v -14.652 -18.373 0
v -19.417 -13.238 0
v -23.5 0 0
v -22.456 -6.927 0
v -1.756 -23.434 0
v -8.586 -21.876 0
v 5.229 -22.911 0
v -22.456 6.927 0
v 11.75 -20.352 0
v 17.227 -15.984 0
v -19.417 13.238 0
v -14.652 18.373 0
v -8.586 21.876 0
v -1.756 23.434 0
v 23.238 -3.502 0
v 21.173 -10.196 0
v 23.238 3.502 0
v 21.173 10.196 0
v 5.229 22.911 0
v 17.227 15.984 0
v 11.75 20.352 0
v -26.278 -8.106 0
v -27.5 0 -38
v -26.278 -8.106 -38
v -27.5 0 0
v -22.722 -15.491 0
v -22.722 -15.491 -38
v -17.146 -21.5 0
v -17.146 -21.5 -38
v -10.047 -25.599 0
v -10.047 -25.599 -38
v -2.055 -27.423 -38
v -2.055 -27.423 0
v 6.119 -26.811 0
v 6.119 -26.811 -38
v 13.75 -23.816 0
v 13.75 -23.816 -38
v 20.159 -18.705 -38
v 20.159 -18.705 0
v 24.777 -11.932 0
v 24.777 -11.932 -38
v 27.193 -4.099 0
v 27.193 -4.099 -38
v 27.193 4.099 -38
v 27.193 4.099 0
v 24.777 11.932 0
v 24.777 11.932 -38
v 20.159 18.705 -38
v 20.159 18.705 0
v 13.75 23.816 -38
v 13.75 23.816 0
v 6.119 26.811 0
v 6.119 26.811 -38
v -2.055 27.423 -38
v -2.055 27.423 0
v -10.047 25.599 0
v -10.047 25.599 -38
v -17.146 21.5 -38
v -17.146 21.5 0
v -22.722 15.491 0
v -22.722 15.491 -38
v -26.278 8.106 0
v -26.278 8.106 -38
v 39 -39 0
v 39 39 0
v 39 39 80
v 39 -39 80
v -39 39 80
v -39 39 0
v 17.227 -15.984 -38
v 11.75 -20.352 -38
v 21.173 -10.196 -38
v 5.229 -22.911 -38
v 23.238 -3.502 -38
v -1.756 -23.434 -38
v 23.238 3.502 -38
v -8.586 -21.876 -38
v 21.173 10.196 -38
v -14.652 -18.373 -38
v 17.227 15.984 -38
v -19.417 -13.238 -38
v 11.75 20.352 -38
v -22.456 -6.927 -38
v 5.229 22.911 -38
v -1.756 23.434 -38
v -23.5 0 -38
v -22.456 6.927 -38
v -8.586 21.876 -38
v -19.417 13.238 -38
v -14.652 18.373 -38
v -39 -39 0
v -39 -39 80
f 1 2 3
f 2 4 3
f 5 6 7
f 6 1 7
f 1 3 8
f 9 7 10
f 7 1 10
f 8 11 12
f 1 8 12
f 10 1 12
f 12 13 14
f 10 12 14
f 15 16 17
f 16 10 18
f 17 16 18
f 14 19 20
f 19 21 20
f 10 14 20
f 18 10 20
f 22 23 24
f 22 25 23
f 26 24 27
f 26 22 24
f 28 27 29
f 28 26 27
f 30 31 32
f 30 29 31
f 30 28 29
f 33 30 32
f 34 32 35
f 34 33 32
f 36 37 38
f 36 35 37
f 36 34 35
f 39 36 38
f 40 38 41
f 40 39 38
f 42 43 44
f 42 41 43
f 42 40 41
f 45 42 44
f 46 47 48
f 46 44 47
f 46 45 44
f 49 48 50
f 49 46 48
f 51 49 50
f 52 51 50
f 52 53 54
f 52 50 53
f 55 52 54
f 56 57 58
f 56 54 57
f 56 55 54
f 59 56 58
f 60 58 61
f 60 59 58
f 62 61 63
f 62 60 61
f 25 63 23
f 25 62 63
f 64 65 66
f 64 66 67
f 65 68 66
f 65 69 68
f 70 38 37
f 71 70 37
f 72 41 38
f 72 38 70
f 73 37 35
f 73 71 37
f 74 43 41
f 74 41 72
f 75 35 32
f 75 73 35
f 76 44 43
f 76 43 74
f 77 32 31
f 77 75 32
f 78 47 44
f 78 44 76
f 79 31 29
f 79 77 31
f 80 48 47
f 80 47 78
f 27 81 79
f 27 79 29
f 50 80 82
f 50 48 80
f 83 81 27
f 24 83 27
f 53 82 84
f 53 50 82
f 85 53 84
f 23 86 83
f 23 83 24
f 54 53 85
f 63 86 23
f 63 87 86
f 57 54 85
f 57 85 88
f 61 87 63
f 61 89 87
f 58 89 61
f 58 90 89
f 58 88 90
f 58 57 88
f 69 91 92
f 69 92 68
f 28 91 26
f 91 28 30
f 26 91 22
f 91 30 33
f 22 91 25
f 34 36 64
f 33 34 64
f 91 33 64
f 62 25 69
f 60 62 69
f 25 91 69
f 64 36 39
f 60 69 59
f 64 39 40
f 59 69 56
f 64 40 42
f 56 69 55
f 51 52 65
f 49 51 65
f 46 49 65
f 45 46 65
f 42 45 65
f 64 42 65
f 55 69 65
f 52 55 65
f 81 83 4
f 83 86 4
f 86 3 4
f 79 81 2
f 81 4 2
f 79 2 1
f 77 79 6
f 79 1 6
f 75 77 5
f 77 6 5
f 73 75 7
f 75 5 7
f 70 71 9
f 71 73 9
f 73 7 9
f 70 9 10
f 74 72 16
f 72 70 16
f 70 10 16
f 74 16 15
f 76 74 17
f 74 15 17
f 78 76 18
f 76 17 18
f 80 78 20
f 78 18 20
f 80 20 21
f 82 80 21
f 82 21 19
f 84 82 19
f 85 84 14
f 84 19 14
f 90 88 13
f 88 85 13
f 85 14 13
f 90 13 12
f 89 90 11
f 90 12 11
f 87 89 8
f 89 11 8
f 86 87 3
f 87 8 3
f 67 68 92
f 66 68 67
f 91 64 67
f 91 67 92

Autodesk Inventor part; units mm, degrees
ref_plane "YZ Plane" through (0, 0, 0) normal (1, 0, 0) x (0, 1, 0)
ref_plane "XZ Plane" through (0, 0, 0) normal (0, 1, 0) x (-1, 0, 0)
ref_plane "XY Plane" through (0, 0, 0) normal (0, 0, 1) x (1, 0, 0)
sketch "Sketch1" plane through (0, 0, 0) normal (0, 0, 1) x (1, 0, 0)
  line L0 (0, 54.6) -> (0, -54.6) construction
  line L1 (-54.6, 0) -> (54.6, 0) construction
  line L2 (-39, 39) -> (39, 39)
  line L3 (39, 39) -> (39, -39)
  line L4 (39, -39) -> (-39, -39)
  line L5 (-39, -39) -> (-39, 39)
  point P0 (0, 0)
  dimension "d0" = 78
  dimension "d1" = 78
extrude "Extrusion1" add sketch "Sketch1" along normal blind 80
sketch "Sketch2" plane through (0, 0, 0) normal (0, 0, -1) x (-1, 0, 0)
  circle A0 centre (0, 0) radius 27.5
  circle A1 centre (0, 0) radius 23.5
  dimension "d4" = 55
  dimension "d5" = 47
extrude "Extrusion2" add sketch "Sketch2" along normal blind 38
properties part number "Iris15_Volume_Incorrect"
